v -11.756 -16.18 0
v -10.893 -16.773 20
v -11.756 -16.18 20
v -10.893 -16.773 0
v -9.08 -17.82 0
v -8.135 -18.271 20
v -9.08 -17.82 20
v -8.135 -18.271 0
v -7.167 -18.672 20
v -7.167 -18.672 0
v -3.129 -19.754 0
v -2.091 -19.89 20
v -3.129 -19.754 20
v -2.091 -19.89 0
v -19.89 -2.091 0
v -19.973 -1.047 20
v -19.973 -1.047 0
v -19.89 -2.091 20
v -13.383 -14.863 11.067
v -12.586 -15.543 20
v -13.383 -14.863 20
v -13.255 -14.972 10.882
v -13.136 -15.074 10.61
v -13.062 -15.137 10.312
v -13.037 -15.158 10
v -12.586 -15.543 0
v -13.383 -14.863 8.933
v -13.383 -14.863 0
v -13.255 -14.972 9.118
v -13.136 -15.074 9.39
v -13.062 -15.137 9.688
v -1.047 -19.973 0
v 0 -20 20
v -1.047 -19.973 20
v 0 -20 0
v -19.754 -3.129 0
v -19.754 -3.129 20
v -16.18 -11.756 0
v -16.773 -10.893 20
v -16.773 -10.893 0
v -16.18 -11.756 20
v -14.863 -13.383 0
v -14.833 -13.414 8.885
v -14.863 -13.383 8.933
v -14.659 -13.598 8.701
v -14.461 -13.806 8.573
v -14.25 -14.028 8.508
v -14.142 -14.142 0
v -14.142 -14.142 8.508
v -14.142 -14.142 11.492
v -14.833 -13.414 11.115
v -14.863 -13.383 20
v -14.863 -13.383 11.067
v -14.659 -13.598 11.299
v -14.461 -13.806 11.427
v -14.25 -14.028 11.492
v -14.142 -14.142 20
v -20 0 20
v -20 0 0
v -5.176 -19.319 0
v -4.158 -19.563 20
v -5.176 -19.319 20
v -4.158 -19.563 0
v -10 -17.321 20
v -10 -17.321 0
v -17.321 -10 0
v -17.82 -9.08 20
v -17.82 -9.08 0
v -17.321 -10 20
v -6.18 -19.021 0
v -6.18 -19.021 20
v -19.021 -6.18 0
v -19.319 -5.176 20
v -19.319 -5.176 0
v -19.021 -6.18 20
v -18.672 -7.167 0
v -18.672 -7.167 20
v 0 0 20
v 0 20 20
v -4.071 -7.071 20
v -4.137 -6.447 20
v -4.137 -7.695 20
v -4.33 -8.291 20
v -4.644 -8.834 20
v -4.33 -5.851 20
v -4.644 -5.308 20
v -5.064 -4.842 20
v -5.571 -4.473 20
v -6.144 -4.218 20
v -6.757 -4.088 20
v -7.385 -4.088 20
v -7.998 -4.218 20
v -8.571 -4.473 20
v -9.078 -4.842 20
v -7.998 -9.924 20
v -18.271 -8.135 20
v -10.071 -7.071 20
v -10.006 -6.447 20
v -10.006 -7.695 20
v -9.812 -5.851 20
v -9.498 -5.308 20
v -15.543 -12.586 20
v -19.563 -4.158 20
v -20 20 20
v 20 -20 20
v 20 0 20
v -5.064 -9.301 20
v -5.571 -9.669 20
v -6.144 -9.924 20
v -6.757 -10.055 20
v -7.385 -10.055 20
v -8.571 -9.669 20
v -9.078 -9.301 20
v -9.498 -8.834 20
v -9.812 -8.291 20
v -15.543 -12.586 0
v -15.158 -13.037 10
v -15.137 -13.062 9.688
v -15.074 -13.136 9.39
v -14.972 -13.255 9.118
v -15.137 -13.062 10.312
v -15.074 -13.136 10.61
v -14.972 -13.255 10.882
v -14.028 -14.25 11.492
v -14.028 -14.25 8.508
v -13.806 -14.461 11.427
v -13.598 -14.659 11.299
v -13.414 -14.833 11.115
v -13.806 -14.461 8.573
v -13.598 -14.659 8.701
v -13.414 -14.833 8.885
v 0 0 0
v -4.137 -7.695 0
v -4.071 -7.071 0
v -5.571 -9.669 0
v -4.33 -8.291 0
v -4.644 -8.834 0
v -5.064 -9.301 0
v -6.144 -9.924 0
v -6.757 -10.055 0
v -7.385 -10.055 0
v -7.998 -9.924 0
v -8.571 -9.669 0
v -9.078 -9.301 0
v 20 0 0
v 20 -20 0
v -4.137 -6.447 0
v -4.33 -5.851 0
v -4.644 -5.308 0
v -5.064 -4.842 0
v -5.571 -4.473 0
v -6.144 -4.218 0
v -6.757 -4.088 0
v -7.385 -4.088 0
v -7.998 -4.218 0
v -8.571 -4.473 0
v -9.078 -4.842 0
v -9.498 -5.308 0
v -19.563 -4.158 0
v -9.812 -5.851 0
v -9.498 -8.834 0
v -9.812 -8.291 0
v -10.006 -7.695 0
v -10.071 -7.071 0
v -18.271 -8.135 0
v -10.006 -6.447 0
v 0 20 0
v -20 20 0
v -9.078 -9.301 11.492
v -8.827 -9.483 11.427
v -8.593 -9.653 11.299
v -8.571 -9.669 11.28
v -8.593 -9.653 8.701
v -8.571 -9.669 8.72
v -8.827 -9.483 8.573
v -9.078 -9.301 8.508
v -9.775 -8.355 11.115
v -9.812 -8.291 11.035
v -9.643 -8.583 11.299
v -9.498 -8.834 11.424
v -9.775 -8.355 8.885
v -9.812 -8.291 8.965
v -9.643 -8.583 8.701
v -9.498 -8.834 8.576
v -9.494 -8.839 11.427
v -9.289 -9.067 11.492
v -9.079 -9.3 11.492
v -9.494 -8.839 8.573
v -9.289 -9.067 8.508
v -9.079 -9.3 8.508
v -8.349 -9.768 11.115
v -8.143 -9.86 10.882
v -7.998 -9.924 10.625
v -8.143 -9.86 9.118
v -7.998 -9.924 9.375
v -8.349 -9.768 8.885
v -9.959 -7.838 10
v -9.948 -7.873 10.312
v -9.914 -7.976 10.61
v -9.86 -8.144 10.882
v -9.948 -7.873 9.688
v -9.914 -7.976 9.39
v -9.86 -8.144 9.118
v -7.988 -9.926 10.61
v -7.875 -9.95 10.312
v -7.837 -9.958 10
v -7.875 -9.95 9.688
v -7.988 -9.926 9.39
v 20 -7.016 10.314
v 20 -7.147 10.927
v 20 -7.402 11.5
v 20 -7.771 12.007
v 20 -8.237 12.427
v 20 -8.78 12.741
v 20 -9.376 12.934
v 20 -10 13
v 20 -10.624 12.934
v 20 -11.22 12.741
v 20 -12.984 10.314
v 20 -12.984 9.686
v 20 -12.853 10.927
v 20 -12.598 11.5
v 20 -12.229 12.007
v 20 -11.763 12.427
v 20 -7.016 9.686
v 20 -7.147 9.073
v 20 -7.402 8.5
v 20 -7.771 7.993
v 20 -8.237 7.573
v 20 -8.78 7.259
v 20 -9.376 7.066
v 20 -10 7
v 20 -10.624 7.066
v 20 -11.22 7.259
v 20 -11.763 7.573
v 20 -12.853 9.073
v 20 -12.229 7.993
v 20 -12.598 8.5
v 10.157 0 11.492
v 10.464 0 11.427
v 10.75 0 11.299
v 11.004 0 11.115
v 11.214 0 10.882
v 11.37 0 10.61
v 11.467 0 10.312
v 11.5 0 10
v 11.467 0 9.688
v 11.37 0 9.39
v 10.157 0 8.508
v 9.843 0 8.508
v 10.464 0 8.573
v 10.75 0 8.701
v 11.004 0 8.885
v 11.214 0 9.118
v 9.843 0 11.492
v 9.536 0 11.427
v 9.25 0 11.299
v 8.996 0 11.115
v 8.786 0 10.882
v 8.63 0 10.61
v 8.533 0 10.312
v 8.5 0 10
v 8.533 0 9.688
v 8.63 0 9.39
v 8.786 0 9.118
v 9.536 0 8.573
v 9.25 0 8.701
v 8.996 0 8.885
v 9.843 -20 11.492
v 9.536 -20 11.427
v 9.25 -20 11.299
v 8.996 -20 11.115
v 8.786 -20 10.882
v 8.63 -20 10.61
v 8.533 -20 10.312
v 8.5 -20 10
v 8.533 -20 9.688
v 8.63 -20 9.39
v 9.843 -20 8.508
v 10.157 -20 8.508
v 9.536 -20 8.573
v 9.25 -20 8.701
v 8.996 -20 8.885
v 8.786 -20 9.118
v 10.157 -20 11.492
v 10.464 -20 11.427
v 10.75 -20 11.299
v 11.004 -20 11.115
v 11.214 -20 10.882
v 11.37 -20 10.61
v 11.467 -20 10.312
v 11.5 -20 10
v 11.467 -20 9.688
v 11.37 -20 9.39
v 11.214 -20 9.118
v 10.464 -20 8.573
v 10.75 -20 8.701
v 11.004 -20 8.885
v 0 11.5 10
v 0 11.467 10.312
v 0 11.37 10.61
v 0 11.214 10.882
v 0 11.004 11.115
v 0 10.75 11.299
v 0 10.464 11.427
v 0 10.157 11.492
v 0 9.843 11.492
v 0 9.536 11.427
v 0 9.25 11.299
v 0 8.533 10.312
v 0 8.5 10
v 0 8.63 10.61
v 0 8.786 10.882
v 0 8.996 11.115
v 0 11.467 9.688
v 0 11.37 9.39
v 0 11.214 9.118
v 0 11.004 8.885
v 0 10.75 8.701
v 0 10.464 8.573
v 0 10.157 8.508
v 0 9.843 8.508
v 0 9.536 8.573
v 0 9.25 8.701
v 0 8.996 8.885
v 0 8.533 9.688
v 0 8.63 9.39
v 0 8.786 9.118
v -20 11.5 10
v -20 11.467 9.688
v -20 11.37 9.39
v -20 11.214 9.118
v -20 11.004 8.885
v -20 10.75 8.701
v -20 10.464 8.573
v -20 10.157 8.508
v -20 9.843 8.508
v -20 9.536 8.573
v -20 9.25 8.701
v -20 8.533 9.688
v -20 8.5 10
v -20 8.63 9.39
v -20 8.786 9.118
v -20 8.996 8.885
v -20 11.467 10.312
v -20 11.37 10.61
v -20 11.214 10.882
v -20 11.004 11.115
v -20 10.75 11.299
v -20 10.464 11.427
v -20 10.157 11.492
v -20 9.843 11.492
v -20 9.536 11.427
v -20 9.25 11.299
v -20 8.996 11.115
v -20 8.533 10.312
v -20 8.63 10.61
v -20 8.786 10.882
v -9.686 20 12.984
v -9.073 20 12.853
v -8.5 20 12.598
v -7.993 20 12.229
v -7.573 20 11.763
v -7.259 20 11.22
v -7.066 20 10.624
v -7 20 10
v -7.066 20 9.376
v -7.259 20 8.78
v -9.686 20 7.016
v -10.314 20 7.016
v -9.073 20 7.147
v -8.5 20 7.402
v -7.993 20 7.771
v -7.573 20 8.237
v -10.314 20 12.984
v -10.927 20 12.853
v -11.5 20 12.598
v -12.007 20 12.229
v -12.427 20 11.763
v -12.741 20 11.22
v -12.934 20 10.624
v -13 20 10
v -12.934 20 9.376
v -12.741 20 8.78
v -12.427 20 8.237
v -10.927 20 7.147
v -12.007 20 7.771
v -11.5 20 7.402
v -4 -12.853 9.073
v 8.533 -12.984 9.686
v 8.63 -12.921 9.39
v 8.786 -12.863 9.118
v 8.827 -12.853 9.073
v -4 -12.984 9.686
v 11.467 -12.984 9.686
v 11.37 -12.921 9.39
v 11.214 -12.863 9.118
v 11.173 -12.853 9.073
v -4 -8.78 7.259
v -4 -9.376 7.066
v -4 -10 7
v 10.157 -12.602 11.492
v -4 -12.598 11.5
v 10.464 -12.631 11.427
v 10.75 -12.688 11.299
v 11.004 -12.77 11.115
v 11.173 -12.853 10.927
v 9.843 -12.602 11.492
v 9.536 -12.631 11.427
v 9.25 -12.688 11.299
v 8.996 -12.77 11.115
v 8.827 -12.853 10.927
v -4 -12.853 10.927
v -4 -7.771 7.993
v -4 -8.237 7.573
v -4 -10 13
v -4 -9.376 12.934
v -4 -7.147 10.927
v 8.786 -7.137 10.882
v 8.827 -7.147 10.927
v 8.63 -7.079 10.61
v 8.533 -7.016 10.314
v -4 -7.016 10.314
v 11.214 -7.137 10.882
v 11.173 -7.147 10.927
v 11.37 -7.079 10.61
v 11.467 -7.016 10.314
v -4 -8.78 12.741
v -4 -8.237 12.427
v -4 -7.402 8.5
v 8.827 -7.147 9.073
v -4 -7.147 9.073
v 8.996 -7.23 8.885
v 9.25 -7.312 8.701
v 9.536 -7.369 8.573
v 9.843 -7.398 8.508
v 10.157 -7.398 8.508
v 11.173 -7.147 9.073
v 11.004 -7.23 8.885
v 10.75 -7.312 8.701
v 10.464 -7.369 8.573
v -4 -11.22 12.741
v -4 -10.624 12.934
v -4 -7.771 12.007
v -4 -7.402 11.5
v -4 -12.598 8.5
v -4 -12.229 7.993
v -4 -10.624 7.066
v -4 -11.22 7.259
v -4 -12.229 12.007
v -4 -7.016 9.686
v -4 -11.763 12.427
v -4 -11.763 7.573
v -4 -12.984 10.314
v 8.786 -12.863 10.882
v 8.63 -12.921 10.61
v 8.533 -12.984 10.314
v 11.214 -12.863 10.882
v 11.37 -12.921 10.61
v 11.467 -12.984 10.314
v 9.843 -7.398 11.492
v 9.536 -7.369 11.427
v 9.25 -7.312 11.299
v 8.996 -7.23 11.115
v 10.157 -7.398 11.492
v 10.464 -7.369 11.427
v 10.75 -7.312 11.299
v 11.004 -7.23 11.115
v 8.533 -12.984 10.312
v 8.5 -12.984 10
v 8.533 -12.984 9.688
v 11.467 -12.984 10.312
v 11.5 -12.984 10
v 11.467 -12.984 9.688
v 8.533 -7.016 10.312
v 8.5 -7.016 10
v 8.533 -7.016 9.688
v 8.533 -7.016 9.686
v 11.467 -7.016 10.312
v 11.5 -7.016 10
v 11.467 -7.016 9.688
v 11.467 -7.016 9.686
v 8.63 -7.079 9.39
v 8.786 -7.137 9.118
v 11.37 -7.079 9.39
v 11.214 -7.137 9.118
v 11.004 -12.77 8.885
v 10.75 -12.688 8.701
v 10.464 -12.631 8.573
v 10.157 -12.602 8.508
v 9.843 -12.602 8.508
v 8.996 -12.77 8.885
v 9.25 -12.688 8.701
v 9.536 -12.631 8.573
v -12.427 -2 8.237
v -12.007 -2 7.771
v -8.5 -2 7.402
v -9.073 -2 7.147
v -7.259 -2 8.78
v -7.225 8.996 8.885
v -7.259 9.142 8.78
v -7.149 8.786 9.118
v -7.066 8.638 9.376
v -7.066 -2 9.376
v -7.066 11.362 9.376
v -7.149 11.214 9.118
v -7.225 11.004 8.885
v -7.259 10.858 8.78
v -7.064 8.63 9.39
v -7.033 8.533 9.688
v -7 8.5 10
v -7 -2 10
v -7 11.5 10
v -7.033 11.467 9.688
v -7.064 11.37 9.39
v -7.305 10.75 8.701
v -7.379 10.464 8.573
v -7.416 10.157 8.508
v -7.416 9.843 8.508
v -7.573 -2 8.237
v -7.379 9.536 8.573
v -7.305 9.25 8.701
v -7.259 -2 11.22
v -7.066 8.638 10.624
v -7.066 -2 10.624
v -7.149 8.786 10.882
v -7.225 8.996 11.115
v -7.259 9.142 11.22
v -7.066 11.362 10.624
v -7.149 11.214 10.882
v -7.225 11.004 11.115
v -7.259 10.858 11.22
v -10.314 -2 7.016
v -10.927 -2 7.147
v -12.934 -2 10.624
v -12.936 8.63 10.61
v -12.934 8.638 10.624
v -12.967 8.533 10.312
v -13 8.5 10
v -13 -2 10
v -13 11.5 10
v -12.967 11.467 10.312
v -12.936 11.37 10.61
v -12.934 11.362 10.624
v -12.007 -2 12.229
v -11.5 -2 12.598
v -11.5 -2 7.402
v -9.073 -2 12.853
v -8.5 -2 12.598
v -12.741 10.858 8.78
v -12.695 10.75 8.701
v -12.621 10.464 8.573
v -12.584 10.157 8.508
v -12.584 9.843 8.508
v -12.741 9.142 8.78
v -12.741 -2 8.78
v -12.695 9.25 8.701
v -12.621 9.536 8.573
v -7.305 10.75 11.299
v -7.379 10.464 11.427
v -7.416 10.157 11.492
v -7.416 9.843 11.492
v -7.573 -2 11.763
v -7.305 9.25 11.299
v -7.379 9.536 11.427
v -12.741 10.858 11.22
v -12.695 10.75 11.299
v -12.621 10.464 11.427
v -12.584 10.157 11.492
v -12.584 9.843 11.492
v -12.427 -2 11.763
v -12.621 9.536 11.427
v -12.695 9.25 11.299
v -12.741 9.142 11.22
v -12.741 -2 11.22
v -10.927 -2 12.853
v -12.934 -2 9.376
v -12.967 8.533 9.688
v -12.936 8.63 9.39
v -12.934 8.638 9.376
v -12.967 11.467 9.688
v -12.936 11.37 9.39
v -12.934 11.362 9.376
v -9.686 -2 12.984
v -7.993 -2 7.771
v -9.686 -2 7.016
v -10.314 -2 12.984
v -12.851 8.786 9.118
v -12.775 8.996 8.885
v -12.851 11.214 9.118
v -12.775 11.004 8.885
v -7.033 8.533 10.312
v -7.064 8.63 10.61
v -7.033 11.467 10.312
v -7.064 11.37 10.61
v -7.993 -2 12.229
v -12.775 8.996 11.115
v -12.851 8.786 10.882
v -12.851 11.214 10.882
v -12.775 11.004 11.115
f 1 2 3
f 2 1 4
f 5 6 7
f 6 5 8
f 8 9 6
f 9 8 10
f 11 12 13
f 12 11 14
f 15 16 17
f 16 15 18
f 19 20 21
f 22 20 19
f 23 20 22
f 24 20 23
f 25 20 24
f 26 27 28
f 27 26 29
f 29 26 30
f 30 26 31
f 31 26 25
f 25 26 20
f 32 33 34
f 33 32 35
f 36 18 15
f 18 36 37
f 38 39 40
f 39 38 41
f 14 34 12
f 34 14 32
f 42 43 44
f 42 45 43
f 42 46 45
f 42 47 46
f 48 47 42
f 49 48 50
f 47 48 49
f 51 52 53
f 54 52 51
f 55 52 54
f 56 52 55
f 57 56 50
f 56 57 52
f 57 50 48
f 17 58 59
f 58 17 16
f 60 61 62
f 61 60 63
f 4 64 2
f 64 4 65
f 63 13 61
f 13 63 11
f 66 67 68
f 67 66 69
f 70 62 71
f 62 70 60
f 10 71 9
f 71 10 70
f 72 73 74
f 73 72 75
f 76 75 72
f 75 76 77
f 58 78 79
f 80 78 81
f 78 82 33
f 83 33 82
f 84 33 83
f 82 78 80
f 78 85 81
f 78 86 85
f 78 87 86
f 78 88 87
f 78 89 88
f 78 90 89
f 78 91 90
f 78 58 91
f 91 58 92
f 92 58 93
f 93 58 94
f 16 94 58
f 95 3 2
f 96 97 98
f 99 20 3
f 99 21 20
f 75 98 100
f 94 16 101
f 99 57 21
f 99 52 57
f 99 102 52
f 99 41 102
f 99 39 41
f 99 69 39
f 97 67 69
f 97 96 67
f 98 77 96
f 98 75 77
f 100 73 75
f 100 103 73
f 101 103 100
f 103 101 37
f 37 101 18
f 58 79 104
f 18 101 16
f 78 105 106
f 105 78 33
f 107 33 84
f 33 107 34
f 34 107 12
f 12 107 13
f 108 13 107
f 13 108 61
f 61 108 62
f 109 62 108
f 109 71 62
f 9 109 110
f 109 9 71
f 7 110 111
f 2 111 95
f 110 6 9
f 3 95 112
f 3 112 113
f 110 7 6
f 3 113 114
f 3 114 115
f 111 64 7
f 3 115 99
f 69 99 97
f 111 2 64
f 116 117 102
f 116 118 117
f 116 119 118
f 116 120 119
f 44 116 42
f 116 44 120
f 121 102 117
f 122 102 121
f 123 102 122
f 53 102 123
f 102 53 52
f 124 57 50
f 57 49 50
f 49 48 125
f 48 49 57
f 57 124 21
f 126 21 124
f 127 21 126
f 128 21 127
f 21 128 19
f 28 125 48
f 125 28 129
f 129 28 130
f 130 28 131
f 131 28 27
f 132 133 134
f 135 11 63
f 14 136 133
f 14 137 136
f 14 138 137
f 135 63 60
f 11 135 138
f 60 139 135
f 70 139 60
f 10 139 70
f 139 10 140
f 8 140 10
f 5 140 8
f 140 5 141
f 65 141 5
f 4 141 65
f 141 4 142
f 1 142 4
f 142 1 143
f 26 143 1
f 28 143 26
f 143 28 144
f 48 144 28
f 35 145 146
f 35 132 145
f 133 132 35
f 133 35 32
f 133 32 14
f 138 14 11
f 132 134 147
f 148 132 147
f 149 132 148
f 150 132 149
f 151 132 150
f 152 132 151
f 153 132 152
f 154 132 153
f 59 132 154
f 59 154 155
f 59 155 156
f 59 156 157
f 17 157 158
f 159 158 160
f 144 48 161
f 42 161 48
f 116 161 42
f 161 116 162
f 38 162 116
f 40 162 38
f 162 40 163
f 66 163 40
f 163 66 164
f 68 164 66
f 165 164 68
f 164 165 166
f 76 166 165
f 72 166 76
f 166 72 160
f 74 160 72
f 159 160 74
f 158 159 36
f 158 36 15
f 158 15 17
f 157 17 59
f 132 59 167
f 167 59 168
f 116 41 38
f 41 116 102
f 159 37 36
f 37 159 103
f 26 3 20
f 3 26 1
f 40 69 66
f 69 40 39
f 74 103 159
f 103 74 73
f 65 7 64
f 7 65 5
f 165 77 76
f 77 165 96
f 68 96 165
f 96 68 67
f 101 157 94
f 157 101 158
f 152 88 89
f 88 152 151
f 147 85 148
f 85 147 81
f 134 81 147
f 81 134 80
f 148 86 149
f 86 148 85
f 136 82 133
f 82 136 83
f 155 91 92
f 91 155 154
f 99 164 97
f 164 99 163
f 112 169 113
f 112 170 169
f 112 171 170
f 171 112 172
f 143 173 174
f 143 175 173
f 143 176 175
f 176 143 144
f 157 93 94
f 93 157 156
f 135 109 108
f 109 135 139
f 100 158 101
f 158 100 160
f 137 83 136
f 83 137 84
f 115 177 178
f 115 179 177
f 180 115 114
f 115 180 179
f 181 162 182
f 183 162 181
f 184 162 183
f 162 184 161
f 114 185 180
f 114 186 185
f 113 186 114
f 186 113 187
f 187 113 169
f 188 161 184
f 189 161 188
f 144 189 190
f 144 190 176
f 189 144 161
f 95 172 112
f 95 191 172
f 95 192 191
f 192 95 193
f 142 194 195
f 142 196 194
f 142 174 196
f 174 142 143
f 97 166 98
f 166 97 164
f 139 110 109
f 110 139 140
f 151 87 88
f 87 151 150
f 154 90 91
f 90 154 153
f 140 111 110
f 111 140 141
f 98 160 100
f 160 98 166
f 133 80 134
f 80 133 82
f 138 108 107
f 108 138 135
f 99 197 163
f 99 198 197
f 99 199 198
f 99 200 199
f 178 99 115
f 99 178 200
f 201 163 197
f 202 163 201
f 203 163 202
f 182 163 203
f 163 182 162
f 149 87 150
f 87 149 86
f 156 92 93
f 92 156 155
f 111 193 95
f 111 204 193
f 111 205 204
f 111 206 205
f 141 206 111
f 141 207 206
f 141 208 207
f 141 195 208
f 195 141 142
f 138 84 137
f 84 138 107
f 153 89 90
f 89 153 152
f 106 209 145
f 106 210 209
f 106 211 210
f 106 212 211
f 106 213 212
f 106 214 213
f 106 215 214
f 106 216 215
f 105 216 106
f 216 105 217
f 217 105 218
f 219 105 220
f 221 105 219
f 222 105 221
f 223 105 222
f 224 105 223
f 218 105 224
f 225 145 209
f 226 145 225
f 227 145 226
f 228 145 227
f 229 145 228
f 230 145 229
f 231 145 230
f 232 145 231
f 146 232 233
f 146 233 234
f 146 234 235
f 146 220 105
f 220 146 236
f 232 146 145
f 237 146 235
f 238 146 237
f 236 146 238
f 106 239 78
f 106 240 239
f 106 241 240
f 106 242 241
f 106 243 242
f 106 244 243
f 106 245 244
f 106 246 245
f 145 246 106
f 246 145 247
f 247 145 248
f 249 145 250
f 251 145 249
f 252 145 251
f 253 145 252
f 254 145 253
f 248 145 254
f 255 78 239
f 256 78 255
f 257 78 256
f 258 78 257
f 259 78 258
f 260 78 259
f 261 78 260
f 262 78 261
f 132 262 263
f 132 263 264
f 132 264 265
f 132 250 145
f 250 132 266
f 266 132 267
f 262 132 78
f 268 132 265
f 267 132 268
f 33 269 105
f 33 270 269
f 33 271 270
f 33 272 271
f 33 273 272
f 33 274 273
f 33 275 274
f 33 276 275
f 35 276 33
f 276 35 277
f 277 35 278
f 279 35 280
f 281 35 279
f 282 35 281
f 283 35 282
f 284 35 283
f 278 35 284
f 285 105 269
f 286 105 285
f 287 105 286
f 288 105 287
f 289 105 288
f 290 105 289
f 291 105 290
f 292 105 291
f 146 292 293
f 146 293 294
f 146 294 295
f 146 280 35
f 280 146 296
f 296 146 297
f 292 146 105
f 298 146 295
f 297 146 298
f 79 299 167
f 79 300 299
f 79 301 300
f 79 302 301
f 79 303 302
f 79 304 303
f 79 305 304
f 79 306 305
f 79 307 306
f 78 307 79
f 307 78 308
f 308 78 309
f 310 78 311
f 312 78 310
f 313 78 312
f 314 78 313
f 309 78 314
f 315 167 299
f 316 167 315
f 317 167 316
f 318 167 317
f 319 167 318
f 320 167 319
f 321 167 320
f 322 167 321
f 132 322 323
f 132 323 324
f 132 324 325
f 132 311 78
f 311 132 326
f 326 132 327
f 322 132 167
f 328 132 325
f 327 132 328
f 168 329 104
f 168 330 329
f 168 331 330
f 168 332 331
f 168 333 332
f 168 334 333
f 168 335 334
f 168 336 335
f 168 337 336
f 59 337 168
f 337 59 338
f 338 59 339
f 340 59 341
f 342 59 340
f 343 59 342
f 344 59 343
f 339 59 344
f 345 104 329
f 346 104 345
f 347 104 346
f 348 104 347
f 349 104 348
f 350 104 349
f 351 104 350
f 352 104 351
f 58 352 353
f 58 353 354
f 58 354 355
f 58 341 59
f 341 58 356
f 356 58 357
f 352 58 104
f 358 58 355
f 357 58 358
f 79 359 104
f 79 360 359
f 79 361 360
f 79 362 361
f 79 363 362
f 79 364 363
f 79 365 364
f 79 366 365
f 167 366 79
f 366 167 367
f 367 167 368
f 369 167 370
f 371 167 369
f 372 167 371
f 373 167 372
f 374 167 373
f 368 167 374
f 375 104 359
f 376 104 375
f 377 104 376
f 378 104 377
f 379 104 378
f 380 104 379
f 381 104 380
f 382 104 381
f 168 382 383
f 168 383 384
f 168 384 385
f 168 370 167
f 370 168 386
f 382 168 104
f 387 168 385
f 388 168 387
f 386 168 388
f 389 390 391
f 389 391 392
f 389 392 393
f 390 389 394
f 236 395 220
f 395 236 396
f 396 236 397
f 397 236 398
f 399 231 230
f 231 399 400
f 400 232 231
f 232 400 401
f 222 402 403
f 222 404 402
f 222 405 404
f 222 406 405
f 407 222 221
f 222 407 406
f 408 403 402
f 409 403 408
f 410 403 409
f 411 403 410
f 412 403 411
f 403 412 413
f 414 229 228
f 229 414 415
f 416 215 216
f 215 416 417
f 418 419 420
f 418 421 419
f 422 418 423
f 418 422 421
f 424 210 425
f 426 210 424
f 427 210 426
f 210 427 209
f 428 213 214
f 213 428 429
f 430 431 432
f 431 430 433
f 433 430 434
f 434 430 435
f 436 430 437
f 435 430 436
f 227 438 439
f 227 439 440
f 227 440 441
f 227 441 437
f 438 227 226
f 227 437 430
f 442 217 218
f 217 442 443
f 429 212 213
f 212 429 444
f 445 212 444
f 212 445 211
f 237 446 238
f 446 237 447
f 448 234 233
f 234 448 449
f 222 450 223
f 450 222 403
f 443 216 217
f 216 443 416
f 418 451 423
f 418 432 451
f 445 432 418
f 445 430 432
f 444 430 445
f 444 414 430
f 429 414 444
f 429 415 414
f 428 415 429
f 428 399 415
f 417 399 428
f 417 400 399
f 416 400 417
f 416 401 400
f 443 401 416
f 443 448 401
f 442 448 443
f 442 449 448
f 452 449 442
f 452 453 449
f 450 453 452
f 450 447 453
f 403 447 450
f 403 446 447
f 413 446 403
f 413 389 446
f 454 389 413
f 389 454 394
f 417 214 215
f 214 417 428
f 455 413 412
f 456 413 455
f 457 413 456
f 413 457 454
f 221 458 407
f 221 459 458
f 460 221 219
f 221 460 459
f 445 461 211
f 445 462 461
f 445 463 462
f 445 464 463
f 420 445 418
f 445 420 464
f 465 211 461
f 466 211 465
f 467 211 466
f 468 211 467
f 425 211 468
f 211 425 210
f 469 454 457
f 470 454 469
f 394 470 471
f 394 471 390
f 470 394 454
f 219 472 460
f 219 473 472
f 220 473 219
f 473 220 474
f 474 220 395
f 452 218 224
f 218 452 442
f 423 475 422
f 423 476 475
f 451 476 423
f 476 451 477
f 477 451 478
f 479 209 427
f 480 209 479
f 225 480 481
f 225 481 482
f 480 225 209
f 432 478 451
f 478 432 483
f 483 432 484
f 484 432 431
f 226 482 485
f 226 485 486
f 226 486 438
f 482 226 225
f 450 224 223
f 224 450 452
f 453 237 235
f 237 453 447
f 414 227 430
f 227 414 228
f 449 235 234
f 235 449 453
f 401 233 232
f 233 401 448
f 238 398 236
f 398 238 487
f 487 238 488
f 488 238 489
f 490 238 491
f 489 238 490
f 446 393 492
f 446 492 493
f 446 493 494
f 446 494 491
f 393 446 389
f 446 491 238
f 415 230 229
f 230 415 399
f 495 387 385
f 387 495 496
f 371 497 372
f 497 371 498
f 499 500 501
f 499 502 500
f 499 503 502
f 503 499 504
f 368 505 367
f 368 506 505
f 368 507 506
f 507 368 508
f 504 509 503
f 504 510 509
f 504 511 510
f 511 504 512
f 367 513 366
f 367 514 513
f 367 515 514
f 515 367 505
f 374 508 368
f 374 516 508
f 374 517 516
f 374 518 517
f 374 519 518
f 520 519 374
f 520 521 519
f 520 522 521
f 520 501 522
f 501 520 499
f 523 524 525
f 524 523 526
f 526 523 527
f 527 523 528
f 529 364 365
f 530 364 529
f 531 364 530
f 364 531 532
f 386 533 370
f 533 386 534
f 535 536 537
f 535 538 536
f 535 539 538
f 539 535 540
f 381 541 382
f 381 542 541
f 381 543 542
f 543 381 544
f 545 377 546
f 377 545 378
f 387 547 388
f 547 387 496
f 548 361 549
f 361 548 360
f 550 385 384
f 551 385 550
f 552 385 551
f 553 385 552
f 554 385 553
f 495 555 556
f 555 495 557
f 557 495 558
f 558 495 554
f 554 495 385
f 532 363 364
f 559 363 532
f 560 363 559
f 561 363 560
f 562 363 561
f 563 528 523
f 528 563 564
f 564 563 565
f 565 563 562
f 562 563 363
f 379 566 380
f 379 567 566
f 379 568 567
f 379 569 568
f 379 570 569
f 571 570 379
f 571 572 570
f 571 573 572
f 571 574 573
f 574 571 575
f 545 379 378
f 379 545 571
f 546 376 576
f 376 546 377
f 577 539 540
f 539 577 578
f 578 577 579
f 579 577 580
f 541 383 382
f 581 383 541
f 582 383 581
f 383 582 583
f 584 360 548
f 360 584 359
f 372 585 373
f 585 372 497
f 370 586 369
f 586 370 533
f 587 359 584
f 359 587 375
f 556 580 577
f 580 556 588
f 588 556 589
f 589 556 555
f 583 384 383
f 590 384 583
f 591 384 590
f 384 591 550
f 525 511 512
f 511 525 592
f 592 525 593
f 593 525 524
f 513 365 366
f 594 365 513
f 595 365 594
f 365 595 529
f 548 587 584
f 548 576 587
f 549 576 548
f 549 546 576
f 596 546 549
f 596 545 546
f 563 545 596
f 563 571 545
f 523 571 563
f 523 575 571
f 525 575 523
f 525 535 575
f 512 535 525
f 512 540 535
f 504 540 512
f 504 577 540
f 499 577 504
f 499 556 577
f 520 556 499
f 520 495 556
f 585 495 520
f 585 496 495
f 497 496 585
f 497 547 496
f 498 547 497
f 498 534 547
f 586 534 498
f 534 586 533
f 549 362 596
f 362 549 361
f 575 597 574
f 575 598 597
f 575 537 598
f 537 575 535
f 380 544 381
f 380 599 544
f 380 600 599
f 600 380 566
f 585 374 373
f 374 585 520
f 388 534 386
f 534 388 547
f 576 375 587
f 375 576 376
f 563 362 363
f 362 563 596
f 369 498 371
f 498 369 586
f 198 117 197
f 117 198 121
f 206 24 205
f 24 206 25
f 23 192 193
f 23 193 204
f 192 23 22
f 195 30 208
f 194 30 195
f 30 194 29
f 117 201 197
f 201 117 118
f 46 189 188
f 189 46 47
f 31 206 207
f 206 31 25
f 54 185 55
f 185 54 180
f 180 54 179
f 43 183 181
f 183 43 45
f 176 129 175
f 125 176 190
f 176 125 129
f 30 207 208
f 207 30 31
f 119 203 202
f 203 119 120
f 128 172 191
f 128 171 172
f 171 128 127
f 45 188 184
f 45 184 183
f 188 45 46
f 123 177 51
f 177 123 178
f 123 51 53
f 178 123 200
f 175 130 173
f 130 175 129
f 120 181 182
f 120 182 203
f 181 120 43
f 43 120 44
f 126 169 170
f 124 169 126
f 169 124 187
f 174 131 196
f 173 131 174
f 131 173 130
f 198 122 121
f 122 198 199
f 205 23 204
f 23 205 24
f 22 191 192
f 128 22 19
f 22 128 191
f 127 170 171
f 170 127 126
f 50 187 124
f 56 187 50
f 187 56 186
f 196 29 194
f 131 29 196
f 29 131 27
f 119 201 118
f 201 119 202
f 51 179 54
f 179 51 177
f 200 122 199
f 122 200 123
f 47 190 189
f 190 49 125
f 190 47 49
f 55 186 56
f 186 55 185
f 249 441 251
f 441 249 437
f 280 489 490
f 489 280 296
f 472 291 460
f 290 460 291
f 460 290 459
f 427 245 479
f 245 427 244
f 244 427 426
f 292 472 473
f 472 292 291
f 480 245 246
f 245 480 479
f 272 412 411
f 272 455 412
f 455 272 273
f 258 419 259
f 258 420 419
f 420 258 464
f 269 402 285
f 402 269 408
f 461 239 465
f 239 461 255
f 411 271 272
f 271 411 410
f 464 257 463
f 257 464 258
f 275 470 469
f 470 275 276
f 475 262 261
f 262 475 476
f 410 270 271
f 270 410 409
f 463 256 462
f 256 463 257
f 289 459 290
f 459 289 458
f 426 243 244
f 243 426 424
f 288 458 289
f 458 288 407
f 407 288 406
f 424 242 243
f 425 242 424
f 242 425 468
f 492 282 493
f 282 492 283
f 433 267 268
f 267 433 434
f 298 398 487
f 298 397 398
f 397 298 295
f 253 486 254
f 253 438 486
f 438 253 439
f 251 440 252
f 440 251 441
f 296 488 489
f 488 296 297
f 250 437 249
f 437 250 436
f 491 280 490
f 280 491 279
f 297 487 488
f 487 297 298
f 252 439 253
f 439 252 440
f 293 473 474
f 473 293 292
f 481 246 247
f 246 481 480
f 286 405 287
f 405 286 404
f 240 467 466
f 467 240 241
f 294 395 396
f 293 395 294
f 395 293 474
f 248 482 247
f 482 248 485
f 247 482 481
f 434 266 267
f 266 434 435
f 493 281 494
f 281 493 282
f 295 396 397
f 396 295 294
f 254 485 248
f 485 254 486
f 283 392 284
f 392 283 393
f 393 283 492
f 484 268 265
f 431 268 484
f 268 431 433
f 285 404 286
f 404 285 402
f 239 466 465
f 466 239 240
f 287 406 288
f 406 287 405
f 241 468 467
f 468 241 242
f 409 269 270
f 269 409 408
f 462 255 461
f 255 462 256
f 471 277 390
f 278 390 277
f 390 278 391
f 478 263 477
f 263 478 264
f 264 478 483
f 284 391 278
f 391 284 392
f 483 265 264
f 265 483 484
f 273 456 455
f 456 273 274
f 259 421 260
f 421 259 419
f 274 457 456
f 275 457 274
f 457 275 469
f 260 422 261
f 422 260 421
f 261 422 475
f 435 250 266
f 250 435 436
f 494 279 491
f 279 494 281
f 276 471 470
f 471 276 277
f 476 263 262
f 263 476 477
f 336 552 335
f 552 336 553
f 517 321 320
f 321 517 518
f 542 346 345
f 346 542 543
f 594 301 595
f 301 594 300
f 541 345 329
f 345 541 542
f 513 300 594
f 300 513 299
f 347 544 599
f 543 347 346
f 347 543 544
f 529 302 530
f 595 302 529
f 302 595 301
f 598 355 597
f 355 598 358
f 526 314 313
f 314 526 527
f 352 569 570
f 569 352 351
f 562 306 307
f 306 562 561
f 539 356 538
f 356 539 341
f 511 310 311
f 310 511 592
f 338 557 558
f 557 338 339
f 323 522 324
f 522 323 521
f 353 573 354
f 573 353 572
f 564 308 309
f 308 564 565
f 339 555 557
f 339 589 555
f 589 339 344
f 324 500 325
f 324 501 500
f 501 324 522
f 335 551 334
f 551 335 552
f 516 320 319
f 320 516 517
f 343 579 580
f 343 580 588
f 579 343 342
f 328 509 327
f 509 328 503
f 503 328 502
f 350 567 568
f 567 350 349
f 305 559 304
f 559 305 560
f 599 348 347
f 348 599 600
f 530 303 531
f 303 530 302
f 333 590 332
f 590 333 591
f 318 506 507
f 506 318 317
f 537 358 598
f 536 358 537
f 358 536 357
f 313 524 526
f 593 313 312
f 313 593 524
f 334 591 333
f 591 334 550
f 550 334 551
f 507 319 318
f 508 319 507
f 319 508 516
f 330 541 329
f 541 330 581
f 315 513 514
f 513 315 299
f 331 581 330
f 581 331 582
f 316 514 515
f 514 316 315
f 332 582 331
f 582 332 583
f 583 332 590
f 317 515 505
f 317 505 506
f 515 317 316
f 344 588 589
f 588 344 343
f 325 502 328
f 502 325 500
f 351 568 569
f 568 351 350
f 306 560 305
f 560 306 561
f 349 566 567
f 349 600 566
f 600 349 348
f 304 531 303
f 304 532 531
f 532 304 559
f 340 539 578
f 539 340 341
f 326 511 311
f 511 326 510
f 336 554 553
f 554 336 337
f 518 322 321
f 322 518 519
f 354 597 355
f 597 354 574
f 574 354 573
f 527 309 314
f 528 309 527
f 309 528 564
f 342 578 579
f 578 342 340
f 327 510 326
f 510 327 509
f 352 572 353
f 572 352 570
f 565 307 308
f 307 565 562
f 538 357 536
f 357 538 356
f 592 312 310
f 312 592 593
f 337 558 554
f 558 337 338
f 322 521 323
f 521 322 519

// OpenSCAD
module frameT1Joint() {
    radius = 20;
    height = 20;
    roleRadius = 3;
    fixingRoleRadius = 3.0 / 2;
    
    difference() {
        
        //main vertical structure
        union(){
            difference() {
                cylinder(r = radius, h = 1*height, $fn=120);
                   
                verticalRolePosition = -sqrt(2)/4*radius;
                translate([verticalRolePosition, verticalRolePosition, -1])
                    cylinder(r = roleRadius, h = 1*height + 2, $fn=30);
                translate([0, 0, -1])
                    cube([radius + 1, radius + 1, 1*height + 2]); 
                translate([-radius, 0, -1])
                    cube([radius + 1, radius + 1, 1*height + 2]);
                translate([0, -radius, -1])
                    cube([radius + 1, radius + 1, 1*height + 2]);
            }
            translate([0, -radius, 0])
                cube([radius, radius, 1*height]);  
            translate([-radius, 0, 0])
                cube([radius, radius, 1*height]);   
        } 
        
        //side cubes roles
        {
            translate([2*height - 2, -radius/2, height/2])
                rotate(a=[0, -90, 0])
                    cylinder(r = roleRadius, h = 2*height + 2, $fn=30);
            
            translate([-radius/2, -2, height/2])
                rotate(a=[-90, 0, 0])
                    cylinder(r = roleRadius, h = 2*height + 2, $fn=30); 
        }
        
        //fixing roles
        {
            translate([-sqrt(2)*height/2, -sqrt(2)*radius/2, height/2])
                    rotate(a=[-90, 0, -45])
                        cylinder(r = fixingRoleRadius, h = height/2, $fn=30);
            translate([-sqrt(2)*height/2, -sqrt(2)*radius/2, 3 *height/2])
                    rotate(a=[-90, 0, -45])
                        cylinder(r = fixingRoleRadius, h = height/2, $fn=30);
            
            translate([height/2, 1, height/2])
                    rotate(a=[90, 0, 0])
                        cylinder(r = fixingRoleRadius, h = height + 2, $fn=30);
            
            translate([-height - 1, height/2, height/2])
                    rotate(a=[90, 0, 90])
                        cylinder(r = fixingRoleRadius, h = height + 2, $fn=30);
                        
        }

    }
            
    
}

frameT1Joint();
